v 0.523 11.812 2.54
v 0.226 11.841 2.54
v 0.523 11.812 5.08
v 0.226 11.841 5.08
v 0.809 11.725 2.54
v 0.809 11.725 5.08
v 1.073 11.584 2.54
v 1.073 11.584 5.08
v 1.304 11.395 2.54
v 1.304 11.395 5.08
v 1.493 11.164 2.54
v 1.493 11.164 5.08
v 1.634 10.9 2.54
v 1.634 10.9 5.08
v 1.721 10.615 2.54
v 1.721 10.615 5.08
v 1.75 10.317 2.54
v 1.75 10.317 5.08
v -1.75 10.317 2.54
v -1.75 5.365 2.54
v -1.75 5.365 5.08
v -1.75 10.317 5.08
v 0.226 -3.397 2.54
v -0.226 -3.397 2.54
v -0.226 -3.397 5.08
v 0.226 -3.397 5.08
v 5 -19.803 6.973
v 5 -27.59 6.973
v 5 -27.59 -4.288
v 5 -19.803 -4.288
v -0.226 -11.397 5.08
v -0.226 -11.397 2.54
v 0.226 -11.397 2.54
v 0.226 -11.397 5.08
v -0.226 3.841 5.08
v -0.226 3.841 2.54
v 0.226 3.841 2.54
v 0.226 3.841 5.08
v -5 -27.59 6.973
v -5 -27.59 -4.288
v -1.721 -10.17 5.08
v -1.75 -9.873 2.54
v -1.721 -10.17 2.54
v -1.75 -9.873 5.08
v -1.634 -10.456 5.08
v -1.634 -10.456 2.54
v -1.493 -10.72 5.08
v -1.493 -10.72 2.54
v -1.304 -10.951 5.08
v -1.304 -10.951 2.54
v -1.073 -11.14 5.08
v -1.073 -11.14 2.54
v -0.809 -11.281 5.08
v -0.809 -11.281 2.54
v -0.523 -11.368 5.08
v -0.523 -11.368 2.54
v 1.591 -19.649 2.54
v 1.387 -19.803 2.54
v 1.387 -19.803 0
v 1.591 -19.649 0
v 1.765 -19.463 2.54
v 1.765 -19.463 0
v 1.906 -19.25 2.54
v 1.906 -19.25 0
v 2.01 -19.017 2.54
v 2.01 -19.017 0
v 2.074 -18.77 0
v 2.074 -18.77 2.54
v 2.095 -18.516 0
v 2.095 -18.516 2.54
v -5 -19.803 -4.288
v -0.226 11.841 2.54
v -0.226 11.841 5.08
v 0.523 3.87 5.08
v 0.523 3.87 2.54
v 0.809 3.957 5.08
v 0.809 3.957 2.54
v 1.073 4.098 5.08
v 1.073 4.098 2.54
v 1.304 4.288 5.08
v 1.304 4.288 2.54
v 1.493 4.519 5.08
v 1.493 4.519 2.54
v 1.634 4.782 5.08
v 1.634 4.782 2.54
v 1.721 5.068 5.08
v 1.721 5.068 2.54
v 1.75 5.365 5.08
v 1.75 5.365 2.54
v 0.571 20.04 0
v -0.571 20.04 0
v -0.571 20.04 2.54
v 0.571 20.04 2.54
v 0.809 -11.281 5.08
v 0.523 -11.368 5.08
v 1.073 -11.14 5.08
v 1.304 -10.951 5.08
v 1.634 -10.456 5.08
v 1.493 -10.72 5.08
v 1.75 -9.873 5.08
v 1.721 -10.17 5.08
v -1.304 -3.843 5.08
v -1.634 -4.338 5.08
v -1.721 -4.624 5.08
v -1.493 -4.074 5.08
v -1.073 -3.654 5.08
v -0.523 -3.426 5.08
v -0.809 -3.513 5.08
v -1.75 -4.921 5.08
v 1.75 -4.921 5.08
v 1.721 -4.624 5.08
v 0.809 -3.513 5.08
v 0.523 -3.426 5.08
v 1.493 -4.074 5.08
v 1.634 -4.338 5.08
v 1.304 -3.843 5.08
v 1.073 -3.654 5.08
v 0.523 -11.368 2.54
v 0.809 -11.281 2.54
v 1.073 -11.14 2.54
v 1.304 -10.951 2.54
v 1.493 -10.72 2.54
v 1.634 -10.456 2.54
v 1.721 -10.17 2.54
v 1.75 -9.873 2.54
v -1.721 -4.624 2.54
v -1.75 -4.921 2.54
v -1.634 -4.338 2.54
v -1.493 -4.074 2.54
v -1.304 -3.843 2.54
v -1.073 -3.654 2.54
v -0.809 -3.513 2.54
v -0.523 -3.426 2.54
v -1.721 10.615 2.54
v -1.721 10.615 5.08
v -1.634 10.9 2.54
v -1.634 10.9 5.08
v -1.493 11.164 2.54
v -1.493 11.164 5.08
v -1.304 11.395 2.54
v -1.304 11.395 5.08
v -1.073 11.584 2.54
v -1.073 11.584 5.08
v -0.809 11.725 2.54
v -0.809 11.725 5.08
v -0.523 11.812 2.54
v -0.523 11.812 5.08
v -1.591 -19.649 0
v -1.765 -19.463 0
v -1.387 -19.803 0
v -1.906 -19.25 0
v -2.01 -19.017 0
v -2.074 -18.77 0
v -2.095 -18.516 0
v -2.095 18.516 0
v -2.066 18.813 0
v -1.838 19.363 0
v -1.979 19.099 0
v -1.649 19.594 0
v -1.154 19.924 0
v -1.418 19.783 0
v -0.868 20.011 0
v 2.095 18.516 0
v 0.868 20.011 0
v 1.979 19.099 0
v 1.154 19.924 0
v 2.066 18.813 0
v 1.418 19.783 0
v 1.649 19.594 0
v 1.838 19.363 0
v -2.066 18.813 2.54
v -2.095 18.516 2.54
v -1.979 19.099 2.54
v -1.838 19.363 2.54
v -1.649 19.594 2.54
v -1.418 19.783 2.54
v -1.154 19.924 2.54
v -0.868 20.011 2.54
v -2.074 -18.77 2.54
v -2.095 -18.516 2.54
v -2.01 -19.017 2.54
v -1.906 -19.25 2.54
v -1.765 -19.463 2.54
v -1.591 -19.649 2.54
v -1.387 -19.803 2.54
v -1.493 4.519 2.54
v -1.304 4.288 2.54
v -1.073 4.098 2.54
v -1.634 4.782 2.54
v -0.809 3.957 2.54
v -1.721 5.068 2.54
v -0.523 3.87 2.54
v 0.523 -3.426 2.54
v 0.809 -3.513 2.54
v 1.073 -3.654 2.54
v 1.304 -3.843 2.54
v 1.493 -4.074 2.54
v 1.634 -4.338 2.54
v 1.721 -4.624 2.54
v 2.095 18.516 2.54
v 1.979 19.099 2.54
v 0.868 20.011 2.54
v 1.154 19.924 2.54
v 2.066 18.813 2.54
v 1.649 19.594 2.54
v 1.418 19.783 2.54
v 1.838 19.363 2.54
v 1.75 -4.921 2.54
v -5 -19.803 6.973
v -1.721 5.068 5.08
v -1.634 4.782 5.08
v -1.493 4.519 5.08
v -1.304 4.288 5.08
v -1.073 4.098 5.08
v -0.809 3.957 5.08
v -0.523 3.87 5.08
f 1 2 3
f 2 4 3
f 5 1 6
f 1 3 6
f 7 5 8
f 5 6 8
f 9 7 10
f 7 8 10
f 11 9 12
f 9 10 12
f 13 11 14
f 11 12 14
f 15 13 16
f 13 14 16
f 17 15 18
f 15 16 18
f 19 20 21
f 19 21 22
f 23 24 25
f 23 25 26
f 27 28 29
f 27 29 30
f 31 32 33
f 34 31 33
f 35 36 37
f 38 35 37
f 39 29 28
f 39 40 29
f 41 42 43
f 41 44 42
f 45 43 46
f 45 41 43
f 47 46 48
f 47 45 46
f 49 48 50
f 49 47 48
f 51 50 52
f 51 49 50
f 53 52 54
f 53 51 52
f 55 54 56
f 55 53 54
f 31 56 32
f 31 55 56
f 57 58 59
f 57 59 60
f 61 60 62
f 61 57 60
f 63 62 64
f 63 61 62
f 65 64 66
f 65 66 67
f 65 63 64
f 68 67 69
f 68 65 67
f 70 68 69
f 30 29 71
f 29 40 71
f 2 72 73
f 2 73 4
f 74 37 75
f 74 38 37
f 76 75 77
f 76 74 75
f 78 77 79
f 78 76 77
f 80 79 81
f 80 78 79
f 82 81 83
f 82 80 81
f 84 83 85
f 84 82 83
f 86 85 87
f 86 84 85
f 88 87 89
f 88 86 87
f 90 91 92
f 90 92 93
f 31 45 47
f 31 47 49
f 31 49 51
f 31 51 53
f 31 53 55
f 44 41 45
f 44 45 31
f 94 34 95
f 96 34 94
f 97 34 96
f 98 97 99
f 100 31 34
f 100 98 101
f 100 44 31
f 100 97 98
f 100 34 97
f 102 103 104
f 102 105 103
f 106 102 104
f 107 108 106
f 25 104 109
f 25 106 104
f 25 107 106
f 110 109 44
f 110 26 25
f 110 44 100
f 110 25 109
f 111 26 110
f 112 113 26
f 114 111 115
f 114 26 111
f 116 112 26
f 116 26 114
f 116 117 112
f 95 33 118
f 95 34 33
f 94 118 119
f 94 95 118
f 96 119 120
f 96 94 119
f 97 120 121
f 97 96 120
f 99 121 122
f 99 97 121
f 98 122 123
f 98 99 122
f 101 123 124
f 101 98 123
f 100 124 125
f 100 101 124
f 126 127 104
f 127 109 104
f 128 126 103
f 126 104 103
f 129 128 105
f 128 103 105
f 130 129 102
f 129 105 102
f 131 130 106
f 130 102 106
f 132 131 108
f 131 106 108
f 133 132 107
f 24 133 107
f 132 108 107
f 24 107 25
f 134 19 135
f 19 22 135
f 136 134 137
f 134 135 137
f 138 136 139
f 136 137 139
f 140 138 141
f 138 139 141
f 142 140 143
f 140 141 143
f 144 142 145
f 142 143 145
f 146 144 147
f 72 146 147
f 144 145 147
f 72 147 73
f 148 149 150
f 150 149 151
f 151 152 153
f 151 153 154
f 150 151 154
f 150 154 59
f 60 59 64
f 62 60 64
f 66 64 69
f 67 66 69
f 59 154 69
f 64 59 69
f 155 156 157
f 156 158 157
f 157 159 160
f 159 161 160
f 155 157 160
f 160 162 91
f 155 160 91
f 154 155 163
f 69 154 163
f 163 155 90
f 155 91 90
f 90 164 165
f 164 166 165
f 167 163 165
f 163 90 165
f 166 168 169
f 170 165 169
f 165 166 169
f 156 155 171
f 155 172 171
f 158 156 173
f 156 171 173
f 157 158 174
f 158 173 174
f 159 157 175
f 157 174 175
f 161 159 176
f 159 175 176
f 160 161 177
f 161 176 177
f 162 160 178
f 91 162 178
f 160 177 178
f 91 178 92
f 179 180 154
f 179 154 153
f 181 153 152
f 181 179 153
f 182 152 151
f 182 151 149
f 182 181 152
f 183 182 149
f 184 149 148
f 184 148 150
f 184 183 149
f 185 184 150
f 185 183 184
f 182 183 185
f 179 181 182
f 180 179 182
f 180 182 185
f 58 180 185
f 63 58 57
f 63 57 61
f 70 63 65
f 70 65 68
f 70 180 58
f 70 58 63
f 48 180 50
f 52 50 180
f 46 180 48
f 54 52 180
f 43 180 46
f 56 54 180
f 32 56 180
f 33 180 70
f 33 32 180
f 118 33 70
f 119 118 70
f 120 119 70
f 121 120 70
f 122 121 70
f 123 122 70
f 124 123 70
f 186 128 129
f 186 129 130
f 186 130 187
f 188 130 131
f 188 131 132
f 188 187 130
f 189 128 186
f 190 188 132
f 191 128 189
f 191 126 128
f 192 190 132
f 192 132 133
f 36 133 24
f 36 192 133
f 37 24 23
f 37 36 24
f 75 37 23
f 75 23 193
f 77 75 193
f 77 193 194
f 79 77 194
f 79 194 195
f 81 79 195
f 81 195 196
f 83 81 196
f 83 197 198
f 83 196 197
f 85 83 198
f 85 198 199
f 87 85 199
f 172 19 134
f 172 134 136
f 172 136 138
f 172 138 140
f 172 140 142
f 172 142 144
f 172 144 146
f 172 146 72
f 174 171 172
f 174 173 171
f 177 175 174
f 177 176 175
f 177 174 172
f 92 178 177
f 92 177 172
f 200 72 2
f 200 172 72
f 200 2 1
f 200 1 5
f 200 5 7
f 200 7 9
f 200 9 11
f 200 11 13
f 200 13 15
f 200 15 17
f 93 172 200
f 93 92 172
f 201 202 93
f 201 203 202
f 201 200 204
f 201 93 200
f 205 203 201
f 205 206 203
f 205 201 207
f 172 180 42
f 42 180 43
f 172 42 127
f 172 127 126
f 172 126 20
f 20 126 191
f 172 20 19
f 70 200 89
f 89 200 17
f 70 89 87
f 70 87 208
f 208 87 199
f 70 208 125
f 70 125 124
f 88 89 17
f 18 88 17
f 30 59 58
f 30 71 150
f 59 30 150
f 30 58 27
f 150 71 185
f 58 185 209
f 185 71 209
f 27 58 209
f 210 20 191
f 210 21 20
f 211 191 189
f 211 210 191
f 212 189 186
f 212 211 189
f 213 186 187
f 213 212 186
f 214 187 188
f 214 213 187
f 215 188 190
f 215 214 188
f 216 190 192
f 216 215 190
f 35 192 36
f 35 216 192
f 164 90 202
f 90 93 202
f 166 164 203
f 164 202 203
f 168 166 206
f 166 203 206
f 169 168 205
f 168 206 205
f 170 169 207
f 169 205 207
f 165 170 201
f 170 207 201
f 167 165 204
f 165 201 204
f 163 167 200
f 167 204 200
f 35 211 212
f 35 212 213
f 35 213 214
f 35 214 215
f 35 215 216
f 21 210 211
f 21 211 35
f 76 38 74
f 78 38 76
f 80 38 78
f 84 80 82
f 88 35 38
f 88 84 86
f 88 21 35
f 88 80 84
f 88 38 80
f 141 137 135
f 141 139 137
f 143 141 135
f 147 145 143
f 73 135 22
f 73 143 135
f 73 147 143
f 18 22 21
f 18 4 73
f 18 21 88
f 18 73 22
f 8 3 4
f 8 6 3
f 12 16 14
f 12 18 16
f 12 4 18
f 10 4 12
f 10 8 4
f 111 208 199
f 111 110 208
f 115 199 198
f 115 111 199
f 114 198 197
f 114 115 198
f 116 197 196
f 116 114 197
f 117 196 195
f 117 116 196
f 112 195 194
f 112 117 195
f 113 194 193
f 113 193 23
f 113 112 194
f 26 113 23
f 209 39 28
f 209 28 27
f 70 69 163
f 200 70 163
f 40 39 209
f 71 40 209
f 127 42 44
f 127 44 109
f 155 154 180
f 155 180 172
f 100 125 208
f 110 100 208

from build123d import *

# Parameters (mm, degrees)
F0_W          = 4.19
F0_H          = 40.08
F2_DEPTH      = 2.54
F1_W          = 3.5
F1_H          = 8
F3_DEPTH      = 5.08
F4_R          = 1.524
F5_R          = 1.524
F6_R          = 1.524
F7_W          = 7.7873766422
F7_H          = 11.2617432605
F8_DEPTH      = 5
F8_DEPTH_BACK = 5


with BuildPart() as f2:
    # F0 (on Top) → F2 (new body)
    with BuildSketch(Plane.XY):
        Rectangle(F0_W, F0_H)
    extrude(amount=F2_DEPTH)

    # F1 (on Top) → F3 (join)
    with BuildSketch(Plane.XY):
        with Locations((0, 7.8411972237)):
            Rectangle(F1_W, F1_H)
        with Locations((0, -7.3970568238)):
            Rectangle(F1_W, F1_H)
    extrude(amount=F3_DEPTH)

    # F4
    f4_edges = [f2.edges().sort_by_distance(p)[0] for p in [
        (-1.75, 11.841197, 3.81),
    ]]
    fillet(f4_edges, radius=F4_R)

    # F5
    f5_edges = [f2.edges().sort_by_distance(p)[0] for p in [
        (1.75, 11.841197, 3.81),
        (1.75, 3.841197, 3.81),
        (1.75, -3.397057, 3.81),
        (1.75, -11.397057, 3.81),
        (-1.75, 3.841197, 3.81),
        (-1.75, -11.397057, 3.81),
        (-1.75, -3.397057, 3.81),
    ]]
    fillet(f5_edges, radius=F5_R)

    # F6
    f6_edges = [f2.edges().sort_by_distance(p)[0] for p in [
        (-2.095, 20.04, 1.27),
        (2.095, 20.04, 1.27),
        (2.095, -20.04, 1.27),
        (-2.095, -20.04, 1.27),
    ]]
    fillet(f6_edges, radius=F6_R)

    # F7 (on Right) → F8 (join, two sides)
    with BuildSketch(Plane.YZ) as f8_sk:
        with Locations((-23.6965231597, 1.3423765777)):
            Rectangle(F7_W, F7_H)
    extrude(amount=-F8_DEPTH)
    extrude(f8_sk.sketch, amount=F8_DEPTH_BACK)


solid = f2.part
